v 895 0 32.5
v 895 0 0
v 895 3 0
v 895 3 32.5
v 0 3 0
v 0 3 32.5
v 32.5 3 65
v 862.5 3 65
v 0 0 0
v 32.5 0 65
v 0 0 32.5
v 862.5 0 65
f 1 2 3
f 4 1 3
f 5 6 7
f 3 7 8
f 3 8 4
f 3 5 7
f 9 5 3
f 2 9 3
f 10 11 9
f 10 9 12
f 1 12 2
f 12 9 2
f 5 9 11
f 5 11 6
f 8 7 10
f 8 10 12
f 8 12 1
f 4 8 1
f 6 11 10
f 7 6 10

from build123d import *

# Parameters (mm, degrees)
F0_W     = 895
F0_H     = 3
F1_DEPTH = 65
F3_DEPTH = 3.001


with BuildPart() as f1:
    # F0 (on Top) → F1 (new body)
    with BuildSketch(Plane.XY):
        with Locations((447.5, 1.5)):
            Rectangle(F0_W, F0_H)
    extrude(amount=F1_DEPTH)

    # F2 (on face) → F3 (cut, through all)
    with BuildSketch(Plane.XZ):
        Polygon((895, 65), (862.5, 65), (895, 32.5), align=None)
        Polygon((0, 65), (0, 32.5), (32.5, 65), align=None)
    extrude(amount=-F3_DEPTH, mode=Mode.SUBTRACT)


solid = f1.part
